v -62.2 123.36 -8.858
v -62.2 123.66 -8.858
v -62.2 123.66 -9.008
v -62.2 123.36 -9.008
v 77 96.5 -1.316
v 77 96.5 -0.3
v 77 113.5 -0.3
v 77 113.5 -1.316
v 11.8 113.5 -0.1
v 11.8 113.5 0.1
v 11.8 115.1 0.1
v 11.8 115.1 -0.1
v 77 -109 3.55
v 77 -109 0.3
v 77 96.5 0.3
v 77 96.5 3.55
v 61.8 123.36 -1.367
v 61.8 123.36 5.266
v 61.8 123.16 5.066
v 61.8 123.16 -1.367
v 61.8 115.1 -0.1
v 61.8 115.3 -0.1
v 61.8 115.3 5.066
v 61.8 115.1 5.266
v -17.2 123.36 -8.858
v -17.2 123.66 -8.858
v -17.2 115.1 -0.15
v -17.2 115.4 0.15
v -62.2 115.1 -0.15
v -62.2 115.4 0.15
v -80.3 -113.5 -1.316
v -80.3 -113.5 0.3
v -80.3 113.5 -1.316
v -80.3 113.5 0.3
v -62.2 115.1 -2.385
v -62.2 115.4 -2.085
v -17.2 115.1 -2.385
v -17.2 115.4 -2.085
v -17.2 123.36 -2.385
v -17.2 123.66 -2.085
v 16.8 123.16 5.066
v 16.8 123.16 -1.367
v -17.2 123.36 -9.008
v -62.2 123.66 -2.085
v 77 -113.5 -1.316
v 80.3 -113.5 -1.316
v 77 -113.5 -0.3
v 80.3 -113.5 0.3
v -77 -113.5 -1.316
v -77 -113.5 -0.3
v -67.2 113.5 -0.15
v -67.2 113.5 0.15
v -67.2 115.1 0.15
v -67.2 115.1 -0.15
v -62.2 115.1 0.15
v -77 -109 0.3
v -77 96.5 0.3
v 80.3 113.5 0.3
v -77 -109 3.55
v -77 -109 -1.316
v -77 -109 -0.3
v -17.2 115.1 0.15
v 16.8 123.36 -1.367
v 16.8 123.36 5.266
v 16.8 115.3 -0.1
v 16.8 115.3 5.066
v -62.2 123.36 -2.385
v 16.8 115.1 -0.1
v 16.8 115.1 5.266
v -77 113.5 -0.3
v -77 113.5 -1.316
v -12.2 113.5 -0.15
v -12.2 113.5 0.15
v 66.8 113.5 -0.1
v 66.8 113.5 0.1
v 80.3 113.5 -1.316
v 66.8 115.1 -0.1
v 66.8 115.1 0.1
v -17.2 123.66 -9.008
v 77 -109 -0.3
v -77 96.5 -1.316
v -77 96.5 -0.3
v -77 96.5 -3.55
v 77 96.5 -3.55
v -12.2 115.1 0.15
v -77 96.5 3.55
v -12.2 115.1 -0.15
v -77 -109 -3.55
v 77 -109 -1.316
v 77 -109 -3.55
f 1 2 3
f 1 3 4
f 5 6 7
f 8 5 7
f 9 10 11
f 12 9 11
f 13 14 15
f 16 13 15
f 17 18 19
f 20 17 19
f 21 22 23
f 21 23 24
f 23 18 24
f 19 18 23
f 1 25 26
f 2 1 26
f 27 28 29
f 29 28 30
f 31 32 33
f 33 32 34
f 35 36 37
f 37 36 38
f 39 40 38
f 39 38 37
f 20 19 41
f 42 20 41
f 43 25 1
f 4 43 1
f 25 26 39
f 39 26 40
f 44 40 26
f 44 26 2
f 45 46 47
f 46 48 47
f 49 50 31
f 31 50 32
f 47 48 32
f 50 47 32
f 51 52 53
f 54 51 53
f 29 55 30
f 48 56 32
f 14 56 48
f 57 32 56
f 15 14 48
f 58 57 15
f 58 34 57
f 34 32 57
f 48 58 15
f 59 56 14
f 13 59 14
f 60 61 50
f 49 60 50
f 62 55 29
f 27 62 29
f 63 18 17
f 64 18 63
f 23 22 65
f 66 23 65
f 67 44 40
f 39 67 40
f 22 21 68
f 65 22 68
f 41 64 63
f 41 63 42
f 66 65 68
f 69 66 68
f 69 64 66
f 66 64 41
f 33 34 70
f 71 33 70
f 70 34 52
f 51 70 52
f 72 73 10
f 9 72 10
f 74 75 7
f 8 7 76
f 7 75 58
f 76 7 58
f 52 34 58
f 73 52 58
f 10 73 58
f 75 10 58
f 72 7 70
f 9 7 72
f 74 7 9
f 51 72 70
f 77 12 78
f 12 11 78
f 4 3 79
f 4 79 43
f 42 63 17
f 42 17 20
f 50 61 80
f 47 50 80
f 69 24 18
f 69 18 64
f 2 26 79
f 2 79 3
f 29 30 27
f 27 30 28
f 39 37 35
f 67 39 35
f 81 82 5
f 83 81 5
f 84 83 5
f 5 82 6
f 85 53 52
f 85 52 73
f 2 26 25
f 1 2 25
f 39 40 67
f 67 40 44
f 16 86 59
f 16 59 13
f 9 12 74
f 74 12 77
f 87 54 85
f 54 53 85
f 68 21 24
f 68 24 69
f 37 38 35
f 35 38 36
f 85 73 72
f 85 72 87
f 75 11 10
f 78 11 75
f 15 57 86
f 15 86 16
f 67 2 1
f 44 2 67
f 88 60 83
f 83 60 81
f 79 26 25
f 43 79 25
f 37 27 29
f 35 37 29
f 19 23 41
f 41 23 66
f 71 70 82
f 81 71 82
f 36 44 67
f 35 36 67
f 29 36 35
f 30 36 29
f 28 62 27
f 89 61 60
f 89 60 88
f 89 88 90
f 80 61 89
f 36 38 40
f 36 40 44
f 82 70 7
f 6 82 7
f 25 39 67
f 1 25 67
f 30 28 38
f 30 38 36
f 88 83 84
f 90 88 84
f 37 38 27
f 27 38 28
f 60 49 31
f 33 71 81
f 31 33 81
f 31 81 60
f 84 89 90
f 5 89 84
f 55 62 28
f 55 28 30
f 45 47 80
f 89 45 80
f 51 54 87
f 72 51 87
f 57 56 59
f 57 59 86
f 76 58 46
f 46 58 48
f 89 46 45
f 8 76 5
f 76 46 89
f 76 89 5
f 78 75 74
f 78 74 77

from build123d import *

# Parameters (mm, degrees)
SKETCH1_W                    = 160.6
SKETCH1_H                    = 227
INSULATION_DEPTH             = 0.3
INSULATION_DEPTH_BACK        = 0.3
SKETCH2_W                    = 154
SKETCH2_H                    = 205.5
MAIN_BODY_DEPTH              = 3.55
MAIN_BODY_DEPTH_BACK         = 3.55
SIDE_FOLDS_DEPTH             = 1.016
SKETCH6_W                    = 55
SKETCH6_H                    = 18.6
NEGATIVE_TAB_BASE_DEPTH      = 0.1
NEGATIVE_TAB_BASE_DEPTH_BACK = 0.1
SKETCH7_W                    = 55
SKETCH7_H                    = 18.6
POSITIVE_TAB_BASE_DEPTH      = 0.15
POSITIVE_TAB_BASE_DEPTH_BACK = 0.15
SKETCH113_W                  = 0.2
SKETCH113_H                  = 45
NEGATIVE_TAB_DEPTH           = 23.600222221
SKETCH113_ON_SEGMENT_2_W     = 0.2
SKETCH113_ON_SEGMENT_2_H     = 45
NEGATIVE_TAB_2_DEPTH         = 52.166374442
SKETCH113_ON_SEGMENT_3_W     = 0.2
SKETCH113_ON_SEGMENT_3_H     = 45
NEGATIVE_TAB_3_DEPTH         = 55.060444442
SKETCH113_ON_SEGMENT_4_W     = 0.2
SKETCH113_ON_SEGMENT_4_H     = 45
NEGATIVE_TAB_4_DEPTH         = 30.633497221
SKETCH113_ON_SEGMENT_5_W     = 0.2
SKETCH113_ON_SEGMENT_5_H     = 45
NEGATIVE_TAB_5_DEPTH         = 1.4
SKETCH110_W                  = 0.3
SKETCH110_H                  = 45
POSITIVE_TAB_DEPTH           = 23.650499994
SKETCH110_ON_SEGMENT_2_W     = 0.3
SKETCH110_ON_SEGMENT_2_H     = 45
POSITIVE_TAB_2_DEPTH         = 49.236449989
SKETCH110_ON_SEGMENT_3_W     = 0.3
SKETCH110_ON_SEGMENT_3_H     = 45
POSITIVE_TAB_3_DEPTH         = 55.260999989
SKETCH110_ON_SEGMENT_4_W     = 0.3
SKETCH110_ON_SEGMENT_4_H     = 45
POSITIVE_TAB_4_DEPTH         = 31.122574994
SKETCH110_ON_SEGMENT_5_W     = 0.3
SKETCH110_ON_SEGMENT_5_H     = 45
POSITIVE_TAB_5_DEPTH         = 1.15


with BuildPart() as part:
    # Sketch1 → Insulation (new, two sides)
    with BuildSketch(Plane.XY) as insulation_sk:
        Rectangle(SKETCH1_W, SKETCH1_H)
    extrude(amount=INSULATION_DEPTH)
    extrude(insulation_sk.sketch, amount=-INSULATION_DEPTH_BACK)

    # Sketch2 → Main Body (add, two sides)
    with BuildSketch(Plane.XY) as main_body_sk:
        with Locations((0, -6.25)):
            Rectangle(SKETCH2_W, SKETCH2_H)
    extrude(amount=MAIN_BODY_DEPTH)
    extrude(main_body_sk.sketch, amount=-MAIN_BODY_DEPTH_BACK)

    # Sketch5 → Side Folds (add)
    with BuildSketch(Plane(origin=(0, 0, -0.3), x_dir=(-1, 0, 0), z_dir=(0, 0, -1))):
        Polygon((-77, -109), (-77, 96.5), (-77, 113.5), (-80.3, 113.5), (-80.3, -113.5), (-77, -113.5), align=None)
        Polygon((77, 113.5), (77, 96.5), (77, -109), (77, -113.5), (80.3, -113.5), (80.3, 113.5), align=None)
    extrude(amount=SIDE_FOLDS_DEPTH)

    # Sketch6 → Negative Tab Base (add, two sides)
    with BuildSketch(Plane.XY) as negative_tab_base_sk:
        with Locations((39.3, 105.8)):
            Rectangle(SKETCH6_W, SKETCH6_H)
    extrude(amount=NEGATIVE_TAB_BASE_DEPTH)
    extrude(negative_tab_base_sk.sketch, amount=-NEGATIVE_TAB_BASE_DEPTH_BACK)

    # Sketch7 → Positive Tab Base (add, two sides)
    with BuildSketch(Plane.XY) as positive_tab_base_sk:
        with Locations((-39.7, 105.8)):
            Rectangle(SKETCH7_W, SKETCH7_H)
    extrude(amount=POSITIVE_TAB_BASE_DEPTH)
    extrude(positive_tab_base_sk.sketch, amount=-POSITIVE_TAB_BASE_DEPTH_BACK)


with BuildPart() as body_2:
    # Sketch113 → Negative Tab (new body)
    with BuildSketch(Plane(origin=(39.3, 115.1, 0), x_dir=(0, 0, -1), z_dir=(0, 1, 0))):
        Rectangle(SKETCH113_W, SKETCH113_H)
    extrude(amount=NEGATIVE_TAB_DEPTH)

    # Negative Tab mitre 1
    split(bisect_by=Plane(origin=(39.3, 115.2, 0), x_dir=(1, 0, 0), z_dir=(0, -0.707106781, -0.707106781)), keep=Keep.TOP)


with BuildPart() as body_3:
    # Sketch113 on segment 2 (carried to segment 2) → Negative Tab 2 (new body)
    with BuildSketch(Plane(origin=(39.3, 115.2, -23.500222221), x_dir=(0, 1, 0), z_dir=(0, 0, 1))):
        Rectangle(SKETCH113_ON_SEGMENT_2_W, SKETCH113_ON_SEGMENT_2_H)
    extrude(amount=NEGATIVE_TAB_2_DEPTH)

    # Negative Tab 2 mitre 1
    split(bisect_by=Plane(origin=(39.3, 115.2, 0), x_dir=(-1, 0, 0), z_dir=(0, 0.707106781, 0.707106781)), keep=Keep.TOP)

    # Negative Tab 2 mitre 2
    split(bisect_by=Plane(origin=(39.3, 115.2, 5.16593), x_dir=(1, 0, 0), z_dir=(0, -0.707106781, -0.707106781)), keep=Keep.TOP)


with BuildPart() as body_4:
    # Sketch113 on segment 3 (carried to segment 3) → Negative Tab 3 (new body)
    with BuildSketch(Plane(origin=(39.3, 91.699777779, 5.16593), x_dir=(0, 0, -1), z_dir=(0, 1, 0))):
        Rectangle(SKETCH113_ON_SEGMENT_3_W, SKETCH113_ON_SEGMENT_3_H)
    extrude(amount=NEGATIVE_TAB_3_DEPTH)

    # Negative Tab 3 mitre 1
    split(bisect_by=Plane(origin=(39.3, 115.2, 5.16593), x_dir=(-1, 0, 0), z_dir=(0, 0.707106781, 0.707106781)), keep=Keep.TOP)

    # Negative Tab 3 mitre 2
    split(bisect_by=Plane(origin=(39.3, 123.26, 5.16593), x_dir=(1, 0, 0), z_dir=(0, -0.707106781, 0.707106781)), keep=Keep.TOP)


with BuildPart() as body_5:
    # Sketch113 on segment 4 (carried to segment 4) → Negative Tab 4 (new body)
    with BuildSketch(Plane(origin=(39.3, 123.26, 28.666152221), x_dir=(0, -1, 0), z_dir=(0, 0, -1))):
        Rectangle(SKETCH113_ON_SEGMENT_4_W, SKETCH113_ON_SEGMENT_4_H)
    extrude(amount=NEGATIVE_TAB_4_DEPTH)

    # Negative Tab 4 mitre 1
    split(bisect_by=Plane(origin=(39.3, 123.26, 5.16593), x_dir=(-1, 0, 0), z_dir=(0, 0.707106781, -0.707106781)), keep=Keep.TOP)

    # Negative Tab 4 mitre 2
    split(bisect_by=Plane(origin=(39.3, 123.26, -0.967345), x_dir=(0, -1, 0), z_dir=(0, 0, 1)), keep=Keep.TOP)


with BuildPart() as body_6:
    # Sketch113 on segment 5 (carried to segment 5) → Negative Tab 5 (new body)
    with BuildSketch(Plane(origin=(39.3, 123.26, 0.032655), x_dir=(0, -1, 0), z_dir=(0, 0, -1))):
        Rectangle(SKETCH113_ON_SEGMENT_5_W, SKETCH113_ON_SEGMENT_5_H)
    extrude(amount=NEGATIVE_TAB_5_DEPTH)

    # Negative Tab 5 mitre 1
    split(bisect_by=Plane(origin=(39.3, 123.26, -0.967345), x_dir=(0, 1, 0), z_dir=(0, 0, -1)), keep=Keep.TOP)


with BuildPart() as body_2_1:
    add(body_2.part)

    # Negative Tab as one body: union body 3, body 4, body 5, body 6
    add(body_3.part)
    add(body_4.part)
    add(body_5.part)
    add(body_6.part)


with BuildPart() as body_3_2:
    # Sketch110 → Positive Tab (new body)
    with BuildSketch(Plane(origin=(-39.7, 115.1, 0), x_dir=(0, 0, -1), z_dir=(0, 1, 0))):
        Rectangle(SKETCH110_W, SKETCH110_H)
    extrude(amount=POSITIVE_TAB_DEPTH)

    # Positive Tab mitre 1
    split(bisect_by=Plane(origin=(-39.7, 115.25, 0), x_dir=(1, 0, 0), z_dir=(0, -0.707106781, 0.707106781)), keep=Keep.TOP)


with BuildPart() as body_4_2:
    # Sketch110 on segment 2 (carried to segment 2) → Positive Tab 2 (new body)
    with BuildSketch(Plane(origin=(-39.7, 115.25, 23.500499994), x_dir=(0, -1, 0), z_dir=(0, 0, -1))):
        Rectangle(SKETCH110_ON_SEGMENT_2_W, SKETCH110_ON_SEGMENT_2_H)
    extrude(amount=POSITIVE_TAB_2_DEPTH)

    # Positive Tab 2 mitre 1
    split(bisect_by=Plane(origin=(-39.7, 115.25, 0), x_dir=(-1, 0, 0), z_dir=(0, 0.707106781, -0.707106781)), keep=Keep.TOP)

    # Positive Tab 2 mitre 2
    split(bisect_by=Plane(origin=(-39.7, 115.25, -2.23545), x_dir=(1, 0, 0), z_dir=(0, -0.707106781, 0.707106781)), keep=Keep.TOP)


with BuildPart() as body_5_2:
    # Sketch110 on segment 3 (carried to segment 3) → Positive Tab 3 (new body)
    with BuildSketch(Plane(origin=(-39.7, 91.749500006, -2.23545), x_dir=(0, 0, -1), z_dir=(0, 1, 0))):
        Rectangle(SKETCH110_ON_SEGMENT_3_W, SKETCH110_ON_SEGMENT_3_H)
    extrude(amount=POSITIVE_TAB_3_DEPTH)

    # Positive Tab 3 mitre 1
    split(bisect_by=Plane(origin=(-39.7, 115.25, -2.23545), x_dir=(-1, 0, 0), z_dir=(0, 0.707106781, -0.707106781)), keep=Keep.TOP)

    # Positive Tab 3 mitre 2
    split(bisect_by=Plane(origin=(-39.7, 123.51, -2.23545), x_dir=(1, 0, 0), z_dir=(0, -0.707106781, 0.707106781)), keep=Keep.TOP)


with BuildPart() as body_6_2:
    # Sketch110 on segment 4 (carried to segment 4) → Positive Tab 4 (new body)
    with BuildSketch(Plane(origin=(-39.7, 123.51, 21.265049994), x_dir=(0, -1, 0), z_dir=(0, 0, -1))):
        Rectangle(SKETCH110_ON_SEGMENT_4_W, SKETCH110_ON_SEGMENT_4_H)
    extrude(amount=POSITIVE_TAB_4_DEPTH)

    # Positive Tab 4 mitre 1
    split(bisect_by=Plane(origin=(-39.7, 123.51, -2.23545), x_dir=(-1, 0, 0), z_dir=(0, 0.707106781, -0.707106781)), keep=Keep.TOP)

    # Positive Tab 4 mitre 2
    split(bisect_by=Plane(origin=(-39.7, 123.51, -8.857525), x_dir=(0, -1, 0), z_dir=(0, 0, 1)), keep=Keep.TOP)


with BuildPart() as body_7:
    # Sketch110 on segment 5 (carried to segment 5) → Positive Tab 5 (new body)
    with BuildSketch(Plane(origin=(-39.7, 123.51, -7.857525), x_dir=(0, -1, 0), z_dir=(0, 0, -1))):
        Rectangle(SKETCH110_ON_SEGMENT_5_W, SKETCH110_ON_SEGMENT_5_H)
    extrude(amount=POSITIVE_TAB_5_DEPTH)

    # Positive Tab 5 mitre 1
    split(bisect_by=Plane(origin=(-39.7, 123.51, -8.857525), x_dir=(0, 1, 0), z_dir=(0, 0, -1)), keep=Keep.TOP)


solid = Compound([part.part, body_2_1.part, body_3_2.part, body_4_2.part, body_5_2.part, body_6_2.part, body_7.part])
